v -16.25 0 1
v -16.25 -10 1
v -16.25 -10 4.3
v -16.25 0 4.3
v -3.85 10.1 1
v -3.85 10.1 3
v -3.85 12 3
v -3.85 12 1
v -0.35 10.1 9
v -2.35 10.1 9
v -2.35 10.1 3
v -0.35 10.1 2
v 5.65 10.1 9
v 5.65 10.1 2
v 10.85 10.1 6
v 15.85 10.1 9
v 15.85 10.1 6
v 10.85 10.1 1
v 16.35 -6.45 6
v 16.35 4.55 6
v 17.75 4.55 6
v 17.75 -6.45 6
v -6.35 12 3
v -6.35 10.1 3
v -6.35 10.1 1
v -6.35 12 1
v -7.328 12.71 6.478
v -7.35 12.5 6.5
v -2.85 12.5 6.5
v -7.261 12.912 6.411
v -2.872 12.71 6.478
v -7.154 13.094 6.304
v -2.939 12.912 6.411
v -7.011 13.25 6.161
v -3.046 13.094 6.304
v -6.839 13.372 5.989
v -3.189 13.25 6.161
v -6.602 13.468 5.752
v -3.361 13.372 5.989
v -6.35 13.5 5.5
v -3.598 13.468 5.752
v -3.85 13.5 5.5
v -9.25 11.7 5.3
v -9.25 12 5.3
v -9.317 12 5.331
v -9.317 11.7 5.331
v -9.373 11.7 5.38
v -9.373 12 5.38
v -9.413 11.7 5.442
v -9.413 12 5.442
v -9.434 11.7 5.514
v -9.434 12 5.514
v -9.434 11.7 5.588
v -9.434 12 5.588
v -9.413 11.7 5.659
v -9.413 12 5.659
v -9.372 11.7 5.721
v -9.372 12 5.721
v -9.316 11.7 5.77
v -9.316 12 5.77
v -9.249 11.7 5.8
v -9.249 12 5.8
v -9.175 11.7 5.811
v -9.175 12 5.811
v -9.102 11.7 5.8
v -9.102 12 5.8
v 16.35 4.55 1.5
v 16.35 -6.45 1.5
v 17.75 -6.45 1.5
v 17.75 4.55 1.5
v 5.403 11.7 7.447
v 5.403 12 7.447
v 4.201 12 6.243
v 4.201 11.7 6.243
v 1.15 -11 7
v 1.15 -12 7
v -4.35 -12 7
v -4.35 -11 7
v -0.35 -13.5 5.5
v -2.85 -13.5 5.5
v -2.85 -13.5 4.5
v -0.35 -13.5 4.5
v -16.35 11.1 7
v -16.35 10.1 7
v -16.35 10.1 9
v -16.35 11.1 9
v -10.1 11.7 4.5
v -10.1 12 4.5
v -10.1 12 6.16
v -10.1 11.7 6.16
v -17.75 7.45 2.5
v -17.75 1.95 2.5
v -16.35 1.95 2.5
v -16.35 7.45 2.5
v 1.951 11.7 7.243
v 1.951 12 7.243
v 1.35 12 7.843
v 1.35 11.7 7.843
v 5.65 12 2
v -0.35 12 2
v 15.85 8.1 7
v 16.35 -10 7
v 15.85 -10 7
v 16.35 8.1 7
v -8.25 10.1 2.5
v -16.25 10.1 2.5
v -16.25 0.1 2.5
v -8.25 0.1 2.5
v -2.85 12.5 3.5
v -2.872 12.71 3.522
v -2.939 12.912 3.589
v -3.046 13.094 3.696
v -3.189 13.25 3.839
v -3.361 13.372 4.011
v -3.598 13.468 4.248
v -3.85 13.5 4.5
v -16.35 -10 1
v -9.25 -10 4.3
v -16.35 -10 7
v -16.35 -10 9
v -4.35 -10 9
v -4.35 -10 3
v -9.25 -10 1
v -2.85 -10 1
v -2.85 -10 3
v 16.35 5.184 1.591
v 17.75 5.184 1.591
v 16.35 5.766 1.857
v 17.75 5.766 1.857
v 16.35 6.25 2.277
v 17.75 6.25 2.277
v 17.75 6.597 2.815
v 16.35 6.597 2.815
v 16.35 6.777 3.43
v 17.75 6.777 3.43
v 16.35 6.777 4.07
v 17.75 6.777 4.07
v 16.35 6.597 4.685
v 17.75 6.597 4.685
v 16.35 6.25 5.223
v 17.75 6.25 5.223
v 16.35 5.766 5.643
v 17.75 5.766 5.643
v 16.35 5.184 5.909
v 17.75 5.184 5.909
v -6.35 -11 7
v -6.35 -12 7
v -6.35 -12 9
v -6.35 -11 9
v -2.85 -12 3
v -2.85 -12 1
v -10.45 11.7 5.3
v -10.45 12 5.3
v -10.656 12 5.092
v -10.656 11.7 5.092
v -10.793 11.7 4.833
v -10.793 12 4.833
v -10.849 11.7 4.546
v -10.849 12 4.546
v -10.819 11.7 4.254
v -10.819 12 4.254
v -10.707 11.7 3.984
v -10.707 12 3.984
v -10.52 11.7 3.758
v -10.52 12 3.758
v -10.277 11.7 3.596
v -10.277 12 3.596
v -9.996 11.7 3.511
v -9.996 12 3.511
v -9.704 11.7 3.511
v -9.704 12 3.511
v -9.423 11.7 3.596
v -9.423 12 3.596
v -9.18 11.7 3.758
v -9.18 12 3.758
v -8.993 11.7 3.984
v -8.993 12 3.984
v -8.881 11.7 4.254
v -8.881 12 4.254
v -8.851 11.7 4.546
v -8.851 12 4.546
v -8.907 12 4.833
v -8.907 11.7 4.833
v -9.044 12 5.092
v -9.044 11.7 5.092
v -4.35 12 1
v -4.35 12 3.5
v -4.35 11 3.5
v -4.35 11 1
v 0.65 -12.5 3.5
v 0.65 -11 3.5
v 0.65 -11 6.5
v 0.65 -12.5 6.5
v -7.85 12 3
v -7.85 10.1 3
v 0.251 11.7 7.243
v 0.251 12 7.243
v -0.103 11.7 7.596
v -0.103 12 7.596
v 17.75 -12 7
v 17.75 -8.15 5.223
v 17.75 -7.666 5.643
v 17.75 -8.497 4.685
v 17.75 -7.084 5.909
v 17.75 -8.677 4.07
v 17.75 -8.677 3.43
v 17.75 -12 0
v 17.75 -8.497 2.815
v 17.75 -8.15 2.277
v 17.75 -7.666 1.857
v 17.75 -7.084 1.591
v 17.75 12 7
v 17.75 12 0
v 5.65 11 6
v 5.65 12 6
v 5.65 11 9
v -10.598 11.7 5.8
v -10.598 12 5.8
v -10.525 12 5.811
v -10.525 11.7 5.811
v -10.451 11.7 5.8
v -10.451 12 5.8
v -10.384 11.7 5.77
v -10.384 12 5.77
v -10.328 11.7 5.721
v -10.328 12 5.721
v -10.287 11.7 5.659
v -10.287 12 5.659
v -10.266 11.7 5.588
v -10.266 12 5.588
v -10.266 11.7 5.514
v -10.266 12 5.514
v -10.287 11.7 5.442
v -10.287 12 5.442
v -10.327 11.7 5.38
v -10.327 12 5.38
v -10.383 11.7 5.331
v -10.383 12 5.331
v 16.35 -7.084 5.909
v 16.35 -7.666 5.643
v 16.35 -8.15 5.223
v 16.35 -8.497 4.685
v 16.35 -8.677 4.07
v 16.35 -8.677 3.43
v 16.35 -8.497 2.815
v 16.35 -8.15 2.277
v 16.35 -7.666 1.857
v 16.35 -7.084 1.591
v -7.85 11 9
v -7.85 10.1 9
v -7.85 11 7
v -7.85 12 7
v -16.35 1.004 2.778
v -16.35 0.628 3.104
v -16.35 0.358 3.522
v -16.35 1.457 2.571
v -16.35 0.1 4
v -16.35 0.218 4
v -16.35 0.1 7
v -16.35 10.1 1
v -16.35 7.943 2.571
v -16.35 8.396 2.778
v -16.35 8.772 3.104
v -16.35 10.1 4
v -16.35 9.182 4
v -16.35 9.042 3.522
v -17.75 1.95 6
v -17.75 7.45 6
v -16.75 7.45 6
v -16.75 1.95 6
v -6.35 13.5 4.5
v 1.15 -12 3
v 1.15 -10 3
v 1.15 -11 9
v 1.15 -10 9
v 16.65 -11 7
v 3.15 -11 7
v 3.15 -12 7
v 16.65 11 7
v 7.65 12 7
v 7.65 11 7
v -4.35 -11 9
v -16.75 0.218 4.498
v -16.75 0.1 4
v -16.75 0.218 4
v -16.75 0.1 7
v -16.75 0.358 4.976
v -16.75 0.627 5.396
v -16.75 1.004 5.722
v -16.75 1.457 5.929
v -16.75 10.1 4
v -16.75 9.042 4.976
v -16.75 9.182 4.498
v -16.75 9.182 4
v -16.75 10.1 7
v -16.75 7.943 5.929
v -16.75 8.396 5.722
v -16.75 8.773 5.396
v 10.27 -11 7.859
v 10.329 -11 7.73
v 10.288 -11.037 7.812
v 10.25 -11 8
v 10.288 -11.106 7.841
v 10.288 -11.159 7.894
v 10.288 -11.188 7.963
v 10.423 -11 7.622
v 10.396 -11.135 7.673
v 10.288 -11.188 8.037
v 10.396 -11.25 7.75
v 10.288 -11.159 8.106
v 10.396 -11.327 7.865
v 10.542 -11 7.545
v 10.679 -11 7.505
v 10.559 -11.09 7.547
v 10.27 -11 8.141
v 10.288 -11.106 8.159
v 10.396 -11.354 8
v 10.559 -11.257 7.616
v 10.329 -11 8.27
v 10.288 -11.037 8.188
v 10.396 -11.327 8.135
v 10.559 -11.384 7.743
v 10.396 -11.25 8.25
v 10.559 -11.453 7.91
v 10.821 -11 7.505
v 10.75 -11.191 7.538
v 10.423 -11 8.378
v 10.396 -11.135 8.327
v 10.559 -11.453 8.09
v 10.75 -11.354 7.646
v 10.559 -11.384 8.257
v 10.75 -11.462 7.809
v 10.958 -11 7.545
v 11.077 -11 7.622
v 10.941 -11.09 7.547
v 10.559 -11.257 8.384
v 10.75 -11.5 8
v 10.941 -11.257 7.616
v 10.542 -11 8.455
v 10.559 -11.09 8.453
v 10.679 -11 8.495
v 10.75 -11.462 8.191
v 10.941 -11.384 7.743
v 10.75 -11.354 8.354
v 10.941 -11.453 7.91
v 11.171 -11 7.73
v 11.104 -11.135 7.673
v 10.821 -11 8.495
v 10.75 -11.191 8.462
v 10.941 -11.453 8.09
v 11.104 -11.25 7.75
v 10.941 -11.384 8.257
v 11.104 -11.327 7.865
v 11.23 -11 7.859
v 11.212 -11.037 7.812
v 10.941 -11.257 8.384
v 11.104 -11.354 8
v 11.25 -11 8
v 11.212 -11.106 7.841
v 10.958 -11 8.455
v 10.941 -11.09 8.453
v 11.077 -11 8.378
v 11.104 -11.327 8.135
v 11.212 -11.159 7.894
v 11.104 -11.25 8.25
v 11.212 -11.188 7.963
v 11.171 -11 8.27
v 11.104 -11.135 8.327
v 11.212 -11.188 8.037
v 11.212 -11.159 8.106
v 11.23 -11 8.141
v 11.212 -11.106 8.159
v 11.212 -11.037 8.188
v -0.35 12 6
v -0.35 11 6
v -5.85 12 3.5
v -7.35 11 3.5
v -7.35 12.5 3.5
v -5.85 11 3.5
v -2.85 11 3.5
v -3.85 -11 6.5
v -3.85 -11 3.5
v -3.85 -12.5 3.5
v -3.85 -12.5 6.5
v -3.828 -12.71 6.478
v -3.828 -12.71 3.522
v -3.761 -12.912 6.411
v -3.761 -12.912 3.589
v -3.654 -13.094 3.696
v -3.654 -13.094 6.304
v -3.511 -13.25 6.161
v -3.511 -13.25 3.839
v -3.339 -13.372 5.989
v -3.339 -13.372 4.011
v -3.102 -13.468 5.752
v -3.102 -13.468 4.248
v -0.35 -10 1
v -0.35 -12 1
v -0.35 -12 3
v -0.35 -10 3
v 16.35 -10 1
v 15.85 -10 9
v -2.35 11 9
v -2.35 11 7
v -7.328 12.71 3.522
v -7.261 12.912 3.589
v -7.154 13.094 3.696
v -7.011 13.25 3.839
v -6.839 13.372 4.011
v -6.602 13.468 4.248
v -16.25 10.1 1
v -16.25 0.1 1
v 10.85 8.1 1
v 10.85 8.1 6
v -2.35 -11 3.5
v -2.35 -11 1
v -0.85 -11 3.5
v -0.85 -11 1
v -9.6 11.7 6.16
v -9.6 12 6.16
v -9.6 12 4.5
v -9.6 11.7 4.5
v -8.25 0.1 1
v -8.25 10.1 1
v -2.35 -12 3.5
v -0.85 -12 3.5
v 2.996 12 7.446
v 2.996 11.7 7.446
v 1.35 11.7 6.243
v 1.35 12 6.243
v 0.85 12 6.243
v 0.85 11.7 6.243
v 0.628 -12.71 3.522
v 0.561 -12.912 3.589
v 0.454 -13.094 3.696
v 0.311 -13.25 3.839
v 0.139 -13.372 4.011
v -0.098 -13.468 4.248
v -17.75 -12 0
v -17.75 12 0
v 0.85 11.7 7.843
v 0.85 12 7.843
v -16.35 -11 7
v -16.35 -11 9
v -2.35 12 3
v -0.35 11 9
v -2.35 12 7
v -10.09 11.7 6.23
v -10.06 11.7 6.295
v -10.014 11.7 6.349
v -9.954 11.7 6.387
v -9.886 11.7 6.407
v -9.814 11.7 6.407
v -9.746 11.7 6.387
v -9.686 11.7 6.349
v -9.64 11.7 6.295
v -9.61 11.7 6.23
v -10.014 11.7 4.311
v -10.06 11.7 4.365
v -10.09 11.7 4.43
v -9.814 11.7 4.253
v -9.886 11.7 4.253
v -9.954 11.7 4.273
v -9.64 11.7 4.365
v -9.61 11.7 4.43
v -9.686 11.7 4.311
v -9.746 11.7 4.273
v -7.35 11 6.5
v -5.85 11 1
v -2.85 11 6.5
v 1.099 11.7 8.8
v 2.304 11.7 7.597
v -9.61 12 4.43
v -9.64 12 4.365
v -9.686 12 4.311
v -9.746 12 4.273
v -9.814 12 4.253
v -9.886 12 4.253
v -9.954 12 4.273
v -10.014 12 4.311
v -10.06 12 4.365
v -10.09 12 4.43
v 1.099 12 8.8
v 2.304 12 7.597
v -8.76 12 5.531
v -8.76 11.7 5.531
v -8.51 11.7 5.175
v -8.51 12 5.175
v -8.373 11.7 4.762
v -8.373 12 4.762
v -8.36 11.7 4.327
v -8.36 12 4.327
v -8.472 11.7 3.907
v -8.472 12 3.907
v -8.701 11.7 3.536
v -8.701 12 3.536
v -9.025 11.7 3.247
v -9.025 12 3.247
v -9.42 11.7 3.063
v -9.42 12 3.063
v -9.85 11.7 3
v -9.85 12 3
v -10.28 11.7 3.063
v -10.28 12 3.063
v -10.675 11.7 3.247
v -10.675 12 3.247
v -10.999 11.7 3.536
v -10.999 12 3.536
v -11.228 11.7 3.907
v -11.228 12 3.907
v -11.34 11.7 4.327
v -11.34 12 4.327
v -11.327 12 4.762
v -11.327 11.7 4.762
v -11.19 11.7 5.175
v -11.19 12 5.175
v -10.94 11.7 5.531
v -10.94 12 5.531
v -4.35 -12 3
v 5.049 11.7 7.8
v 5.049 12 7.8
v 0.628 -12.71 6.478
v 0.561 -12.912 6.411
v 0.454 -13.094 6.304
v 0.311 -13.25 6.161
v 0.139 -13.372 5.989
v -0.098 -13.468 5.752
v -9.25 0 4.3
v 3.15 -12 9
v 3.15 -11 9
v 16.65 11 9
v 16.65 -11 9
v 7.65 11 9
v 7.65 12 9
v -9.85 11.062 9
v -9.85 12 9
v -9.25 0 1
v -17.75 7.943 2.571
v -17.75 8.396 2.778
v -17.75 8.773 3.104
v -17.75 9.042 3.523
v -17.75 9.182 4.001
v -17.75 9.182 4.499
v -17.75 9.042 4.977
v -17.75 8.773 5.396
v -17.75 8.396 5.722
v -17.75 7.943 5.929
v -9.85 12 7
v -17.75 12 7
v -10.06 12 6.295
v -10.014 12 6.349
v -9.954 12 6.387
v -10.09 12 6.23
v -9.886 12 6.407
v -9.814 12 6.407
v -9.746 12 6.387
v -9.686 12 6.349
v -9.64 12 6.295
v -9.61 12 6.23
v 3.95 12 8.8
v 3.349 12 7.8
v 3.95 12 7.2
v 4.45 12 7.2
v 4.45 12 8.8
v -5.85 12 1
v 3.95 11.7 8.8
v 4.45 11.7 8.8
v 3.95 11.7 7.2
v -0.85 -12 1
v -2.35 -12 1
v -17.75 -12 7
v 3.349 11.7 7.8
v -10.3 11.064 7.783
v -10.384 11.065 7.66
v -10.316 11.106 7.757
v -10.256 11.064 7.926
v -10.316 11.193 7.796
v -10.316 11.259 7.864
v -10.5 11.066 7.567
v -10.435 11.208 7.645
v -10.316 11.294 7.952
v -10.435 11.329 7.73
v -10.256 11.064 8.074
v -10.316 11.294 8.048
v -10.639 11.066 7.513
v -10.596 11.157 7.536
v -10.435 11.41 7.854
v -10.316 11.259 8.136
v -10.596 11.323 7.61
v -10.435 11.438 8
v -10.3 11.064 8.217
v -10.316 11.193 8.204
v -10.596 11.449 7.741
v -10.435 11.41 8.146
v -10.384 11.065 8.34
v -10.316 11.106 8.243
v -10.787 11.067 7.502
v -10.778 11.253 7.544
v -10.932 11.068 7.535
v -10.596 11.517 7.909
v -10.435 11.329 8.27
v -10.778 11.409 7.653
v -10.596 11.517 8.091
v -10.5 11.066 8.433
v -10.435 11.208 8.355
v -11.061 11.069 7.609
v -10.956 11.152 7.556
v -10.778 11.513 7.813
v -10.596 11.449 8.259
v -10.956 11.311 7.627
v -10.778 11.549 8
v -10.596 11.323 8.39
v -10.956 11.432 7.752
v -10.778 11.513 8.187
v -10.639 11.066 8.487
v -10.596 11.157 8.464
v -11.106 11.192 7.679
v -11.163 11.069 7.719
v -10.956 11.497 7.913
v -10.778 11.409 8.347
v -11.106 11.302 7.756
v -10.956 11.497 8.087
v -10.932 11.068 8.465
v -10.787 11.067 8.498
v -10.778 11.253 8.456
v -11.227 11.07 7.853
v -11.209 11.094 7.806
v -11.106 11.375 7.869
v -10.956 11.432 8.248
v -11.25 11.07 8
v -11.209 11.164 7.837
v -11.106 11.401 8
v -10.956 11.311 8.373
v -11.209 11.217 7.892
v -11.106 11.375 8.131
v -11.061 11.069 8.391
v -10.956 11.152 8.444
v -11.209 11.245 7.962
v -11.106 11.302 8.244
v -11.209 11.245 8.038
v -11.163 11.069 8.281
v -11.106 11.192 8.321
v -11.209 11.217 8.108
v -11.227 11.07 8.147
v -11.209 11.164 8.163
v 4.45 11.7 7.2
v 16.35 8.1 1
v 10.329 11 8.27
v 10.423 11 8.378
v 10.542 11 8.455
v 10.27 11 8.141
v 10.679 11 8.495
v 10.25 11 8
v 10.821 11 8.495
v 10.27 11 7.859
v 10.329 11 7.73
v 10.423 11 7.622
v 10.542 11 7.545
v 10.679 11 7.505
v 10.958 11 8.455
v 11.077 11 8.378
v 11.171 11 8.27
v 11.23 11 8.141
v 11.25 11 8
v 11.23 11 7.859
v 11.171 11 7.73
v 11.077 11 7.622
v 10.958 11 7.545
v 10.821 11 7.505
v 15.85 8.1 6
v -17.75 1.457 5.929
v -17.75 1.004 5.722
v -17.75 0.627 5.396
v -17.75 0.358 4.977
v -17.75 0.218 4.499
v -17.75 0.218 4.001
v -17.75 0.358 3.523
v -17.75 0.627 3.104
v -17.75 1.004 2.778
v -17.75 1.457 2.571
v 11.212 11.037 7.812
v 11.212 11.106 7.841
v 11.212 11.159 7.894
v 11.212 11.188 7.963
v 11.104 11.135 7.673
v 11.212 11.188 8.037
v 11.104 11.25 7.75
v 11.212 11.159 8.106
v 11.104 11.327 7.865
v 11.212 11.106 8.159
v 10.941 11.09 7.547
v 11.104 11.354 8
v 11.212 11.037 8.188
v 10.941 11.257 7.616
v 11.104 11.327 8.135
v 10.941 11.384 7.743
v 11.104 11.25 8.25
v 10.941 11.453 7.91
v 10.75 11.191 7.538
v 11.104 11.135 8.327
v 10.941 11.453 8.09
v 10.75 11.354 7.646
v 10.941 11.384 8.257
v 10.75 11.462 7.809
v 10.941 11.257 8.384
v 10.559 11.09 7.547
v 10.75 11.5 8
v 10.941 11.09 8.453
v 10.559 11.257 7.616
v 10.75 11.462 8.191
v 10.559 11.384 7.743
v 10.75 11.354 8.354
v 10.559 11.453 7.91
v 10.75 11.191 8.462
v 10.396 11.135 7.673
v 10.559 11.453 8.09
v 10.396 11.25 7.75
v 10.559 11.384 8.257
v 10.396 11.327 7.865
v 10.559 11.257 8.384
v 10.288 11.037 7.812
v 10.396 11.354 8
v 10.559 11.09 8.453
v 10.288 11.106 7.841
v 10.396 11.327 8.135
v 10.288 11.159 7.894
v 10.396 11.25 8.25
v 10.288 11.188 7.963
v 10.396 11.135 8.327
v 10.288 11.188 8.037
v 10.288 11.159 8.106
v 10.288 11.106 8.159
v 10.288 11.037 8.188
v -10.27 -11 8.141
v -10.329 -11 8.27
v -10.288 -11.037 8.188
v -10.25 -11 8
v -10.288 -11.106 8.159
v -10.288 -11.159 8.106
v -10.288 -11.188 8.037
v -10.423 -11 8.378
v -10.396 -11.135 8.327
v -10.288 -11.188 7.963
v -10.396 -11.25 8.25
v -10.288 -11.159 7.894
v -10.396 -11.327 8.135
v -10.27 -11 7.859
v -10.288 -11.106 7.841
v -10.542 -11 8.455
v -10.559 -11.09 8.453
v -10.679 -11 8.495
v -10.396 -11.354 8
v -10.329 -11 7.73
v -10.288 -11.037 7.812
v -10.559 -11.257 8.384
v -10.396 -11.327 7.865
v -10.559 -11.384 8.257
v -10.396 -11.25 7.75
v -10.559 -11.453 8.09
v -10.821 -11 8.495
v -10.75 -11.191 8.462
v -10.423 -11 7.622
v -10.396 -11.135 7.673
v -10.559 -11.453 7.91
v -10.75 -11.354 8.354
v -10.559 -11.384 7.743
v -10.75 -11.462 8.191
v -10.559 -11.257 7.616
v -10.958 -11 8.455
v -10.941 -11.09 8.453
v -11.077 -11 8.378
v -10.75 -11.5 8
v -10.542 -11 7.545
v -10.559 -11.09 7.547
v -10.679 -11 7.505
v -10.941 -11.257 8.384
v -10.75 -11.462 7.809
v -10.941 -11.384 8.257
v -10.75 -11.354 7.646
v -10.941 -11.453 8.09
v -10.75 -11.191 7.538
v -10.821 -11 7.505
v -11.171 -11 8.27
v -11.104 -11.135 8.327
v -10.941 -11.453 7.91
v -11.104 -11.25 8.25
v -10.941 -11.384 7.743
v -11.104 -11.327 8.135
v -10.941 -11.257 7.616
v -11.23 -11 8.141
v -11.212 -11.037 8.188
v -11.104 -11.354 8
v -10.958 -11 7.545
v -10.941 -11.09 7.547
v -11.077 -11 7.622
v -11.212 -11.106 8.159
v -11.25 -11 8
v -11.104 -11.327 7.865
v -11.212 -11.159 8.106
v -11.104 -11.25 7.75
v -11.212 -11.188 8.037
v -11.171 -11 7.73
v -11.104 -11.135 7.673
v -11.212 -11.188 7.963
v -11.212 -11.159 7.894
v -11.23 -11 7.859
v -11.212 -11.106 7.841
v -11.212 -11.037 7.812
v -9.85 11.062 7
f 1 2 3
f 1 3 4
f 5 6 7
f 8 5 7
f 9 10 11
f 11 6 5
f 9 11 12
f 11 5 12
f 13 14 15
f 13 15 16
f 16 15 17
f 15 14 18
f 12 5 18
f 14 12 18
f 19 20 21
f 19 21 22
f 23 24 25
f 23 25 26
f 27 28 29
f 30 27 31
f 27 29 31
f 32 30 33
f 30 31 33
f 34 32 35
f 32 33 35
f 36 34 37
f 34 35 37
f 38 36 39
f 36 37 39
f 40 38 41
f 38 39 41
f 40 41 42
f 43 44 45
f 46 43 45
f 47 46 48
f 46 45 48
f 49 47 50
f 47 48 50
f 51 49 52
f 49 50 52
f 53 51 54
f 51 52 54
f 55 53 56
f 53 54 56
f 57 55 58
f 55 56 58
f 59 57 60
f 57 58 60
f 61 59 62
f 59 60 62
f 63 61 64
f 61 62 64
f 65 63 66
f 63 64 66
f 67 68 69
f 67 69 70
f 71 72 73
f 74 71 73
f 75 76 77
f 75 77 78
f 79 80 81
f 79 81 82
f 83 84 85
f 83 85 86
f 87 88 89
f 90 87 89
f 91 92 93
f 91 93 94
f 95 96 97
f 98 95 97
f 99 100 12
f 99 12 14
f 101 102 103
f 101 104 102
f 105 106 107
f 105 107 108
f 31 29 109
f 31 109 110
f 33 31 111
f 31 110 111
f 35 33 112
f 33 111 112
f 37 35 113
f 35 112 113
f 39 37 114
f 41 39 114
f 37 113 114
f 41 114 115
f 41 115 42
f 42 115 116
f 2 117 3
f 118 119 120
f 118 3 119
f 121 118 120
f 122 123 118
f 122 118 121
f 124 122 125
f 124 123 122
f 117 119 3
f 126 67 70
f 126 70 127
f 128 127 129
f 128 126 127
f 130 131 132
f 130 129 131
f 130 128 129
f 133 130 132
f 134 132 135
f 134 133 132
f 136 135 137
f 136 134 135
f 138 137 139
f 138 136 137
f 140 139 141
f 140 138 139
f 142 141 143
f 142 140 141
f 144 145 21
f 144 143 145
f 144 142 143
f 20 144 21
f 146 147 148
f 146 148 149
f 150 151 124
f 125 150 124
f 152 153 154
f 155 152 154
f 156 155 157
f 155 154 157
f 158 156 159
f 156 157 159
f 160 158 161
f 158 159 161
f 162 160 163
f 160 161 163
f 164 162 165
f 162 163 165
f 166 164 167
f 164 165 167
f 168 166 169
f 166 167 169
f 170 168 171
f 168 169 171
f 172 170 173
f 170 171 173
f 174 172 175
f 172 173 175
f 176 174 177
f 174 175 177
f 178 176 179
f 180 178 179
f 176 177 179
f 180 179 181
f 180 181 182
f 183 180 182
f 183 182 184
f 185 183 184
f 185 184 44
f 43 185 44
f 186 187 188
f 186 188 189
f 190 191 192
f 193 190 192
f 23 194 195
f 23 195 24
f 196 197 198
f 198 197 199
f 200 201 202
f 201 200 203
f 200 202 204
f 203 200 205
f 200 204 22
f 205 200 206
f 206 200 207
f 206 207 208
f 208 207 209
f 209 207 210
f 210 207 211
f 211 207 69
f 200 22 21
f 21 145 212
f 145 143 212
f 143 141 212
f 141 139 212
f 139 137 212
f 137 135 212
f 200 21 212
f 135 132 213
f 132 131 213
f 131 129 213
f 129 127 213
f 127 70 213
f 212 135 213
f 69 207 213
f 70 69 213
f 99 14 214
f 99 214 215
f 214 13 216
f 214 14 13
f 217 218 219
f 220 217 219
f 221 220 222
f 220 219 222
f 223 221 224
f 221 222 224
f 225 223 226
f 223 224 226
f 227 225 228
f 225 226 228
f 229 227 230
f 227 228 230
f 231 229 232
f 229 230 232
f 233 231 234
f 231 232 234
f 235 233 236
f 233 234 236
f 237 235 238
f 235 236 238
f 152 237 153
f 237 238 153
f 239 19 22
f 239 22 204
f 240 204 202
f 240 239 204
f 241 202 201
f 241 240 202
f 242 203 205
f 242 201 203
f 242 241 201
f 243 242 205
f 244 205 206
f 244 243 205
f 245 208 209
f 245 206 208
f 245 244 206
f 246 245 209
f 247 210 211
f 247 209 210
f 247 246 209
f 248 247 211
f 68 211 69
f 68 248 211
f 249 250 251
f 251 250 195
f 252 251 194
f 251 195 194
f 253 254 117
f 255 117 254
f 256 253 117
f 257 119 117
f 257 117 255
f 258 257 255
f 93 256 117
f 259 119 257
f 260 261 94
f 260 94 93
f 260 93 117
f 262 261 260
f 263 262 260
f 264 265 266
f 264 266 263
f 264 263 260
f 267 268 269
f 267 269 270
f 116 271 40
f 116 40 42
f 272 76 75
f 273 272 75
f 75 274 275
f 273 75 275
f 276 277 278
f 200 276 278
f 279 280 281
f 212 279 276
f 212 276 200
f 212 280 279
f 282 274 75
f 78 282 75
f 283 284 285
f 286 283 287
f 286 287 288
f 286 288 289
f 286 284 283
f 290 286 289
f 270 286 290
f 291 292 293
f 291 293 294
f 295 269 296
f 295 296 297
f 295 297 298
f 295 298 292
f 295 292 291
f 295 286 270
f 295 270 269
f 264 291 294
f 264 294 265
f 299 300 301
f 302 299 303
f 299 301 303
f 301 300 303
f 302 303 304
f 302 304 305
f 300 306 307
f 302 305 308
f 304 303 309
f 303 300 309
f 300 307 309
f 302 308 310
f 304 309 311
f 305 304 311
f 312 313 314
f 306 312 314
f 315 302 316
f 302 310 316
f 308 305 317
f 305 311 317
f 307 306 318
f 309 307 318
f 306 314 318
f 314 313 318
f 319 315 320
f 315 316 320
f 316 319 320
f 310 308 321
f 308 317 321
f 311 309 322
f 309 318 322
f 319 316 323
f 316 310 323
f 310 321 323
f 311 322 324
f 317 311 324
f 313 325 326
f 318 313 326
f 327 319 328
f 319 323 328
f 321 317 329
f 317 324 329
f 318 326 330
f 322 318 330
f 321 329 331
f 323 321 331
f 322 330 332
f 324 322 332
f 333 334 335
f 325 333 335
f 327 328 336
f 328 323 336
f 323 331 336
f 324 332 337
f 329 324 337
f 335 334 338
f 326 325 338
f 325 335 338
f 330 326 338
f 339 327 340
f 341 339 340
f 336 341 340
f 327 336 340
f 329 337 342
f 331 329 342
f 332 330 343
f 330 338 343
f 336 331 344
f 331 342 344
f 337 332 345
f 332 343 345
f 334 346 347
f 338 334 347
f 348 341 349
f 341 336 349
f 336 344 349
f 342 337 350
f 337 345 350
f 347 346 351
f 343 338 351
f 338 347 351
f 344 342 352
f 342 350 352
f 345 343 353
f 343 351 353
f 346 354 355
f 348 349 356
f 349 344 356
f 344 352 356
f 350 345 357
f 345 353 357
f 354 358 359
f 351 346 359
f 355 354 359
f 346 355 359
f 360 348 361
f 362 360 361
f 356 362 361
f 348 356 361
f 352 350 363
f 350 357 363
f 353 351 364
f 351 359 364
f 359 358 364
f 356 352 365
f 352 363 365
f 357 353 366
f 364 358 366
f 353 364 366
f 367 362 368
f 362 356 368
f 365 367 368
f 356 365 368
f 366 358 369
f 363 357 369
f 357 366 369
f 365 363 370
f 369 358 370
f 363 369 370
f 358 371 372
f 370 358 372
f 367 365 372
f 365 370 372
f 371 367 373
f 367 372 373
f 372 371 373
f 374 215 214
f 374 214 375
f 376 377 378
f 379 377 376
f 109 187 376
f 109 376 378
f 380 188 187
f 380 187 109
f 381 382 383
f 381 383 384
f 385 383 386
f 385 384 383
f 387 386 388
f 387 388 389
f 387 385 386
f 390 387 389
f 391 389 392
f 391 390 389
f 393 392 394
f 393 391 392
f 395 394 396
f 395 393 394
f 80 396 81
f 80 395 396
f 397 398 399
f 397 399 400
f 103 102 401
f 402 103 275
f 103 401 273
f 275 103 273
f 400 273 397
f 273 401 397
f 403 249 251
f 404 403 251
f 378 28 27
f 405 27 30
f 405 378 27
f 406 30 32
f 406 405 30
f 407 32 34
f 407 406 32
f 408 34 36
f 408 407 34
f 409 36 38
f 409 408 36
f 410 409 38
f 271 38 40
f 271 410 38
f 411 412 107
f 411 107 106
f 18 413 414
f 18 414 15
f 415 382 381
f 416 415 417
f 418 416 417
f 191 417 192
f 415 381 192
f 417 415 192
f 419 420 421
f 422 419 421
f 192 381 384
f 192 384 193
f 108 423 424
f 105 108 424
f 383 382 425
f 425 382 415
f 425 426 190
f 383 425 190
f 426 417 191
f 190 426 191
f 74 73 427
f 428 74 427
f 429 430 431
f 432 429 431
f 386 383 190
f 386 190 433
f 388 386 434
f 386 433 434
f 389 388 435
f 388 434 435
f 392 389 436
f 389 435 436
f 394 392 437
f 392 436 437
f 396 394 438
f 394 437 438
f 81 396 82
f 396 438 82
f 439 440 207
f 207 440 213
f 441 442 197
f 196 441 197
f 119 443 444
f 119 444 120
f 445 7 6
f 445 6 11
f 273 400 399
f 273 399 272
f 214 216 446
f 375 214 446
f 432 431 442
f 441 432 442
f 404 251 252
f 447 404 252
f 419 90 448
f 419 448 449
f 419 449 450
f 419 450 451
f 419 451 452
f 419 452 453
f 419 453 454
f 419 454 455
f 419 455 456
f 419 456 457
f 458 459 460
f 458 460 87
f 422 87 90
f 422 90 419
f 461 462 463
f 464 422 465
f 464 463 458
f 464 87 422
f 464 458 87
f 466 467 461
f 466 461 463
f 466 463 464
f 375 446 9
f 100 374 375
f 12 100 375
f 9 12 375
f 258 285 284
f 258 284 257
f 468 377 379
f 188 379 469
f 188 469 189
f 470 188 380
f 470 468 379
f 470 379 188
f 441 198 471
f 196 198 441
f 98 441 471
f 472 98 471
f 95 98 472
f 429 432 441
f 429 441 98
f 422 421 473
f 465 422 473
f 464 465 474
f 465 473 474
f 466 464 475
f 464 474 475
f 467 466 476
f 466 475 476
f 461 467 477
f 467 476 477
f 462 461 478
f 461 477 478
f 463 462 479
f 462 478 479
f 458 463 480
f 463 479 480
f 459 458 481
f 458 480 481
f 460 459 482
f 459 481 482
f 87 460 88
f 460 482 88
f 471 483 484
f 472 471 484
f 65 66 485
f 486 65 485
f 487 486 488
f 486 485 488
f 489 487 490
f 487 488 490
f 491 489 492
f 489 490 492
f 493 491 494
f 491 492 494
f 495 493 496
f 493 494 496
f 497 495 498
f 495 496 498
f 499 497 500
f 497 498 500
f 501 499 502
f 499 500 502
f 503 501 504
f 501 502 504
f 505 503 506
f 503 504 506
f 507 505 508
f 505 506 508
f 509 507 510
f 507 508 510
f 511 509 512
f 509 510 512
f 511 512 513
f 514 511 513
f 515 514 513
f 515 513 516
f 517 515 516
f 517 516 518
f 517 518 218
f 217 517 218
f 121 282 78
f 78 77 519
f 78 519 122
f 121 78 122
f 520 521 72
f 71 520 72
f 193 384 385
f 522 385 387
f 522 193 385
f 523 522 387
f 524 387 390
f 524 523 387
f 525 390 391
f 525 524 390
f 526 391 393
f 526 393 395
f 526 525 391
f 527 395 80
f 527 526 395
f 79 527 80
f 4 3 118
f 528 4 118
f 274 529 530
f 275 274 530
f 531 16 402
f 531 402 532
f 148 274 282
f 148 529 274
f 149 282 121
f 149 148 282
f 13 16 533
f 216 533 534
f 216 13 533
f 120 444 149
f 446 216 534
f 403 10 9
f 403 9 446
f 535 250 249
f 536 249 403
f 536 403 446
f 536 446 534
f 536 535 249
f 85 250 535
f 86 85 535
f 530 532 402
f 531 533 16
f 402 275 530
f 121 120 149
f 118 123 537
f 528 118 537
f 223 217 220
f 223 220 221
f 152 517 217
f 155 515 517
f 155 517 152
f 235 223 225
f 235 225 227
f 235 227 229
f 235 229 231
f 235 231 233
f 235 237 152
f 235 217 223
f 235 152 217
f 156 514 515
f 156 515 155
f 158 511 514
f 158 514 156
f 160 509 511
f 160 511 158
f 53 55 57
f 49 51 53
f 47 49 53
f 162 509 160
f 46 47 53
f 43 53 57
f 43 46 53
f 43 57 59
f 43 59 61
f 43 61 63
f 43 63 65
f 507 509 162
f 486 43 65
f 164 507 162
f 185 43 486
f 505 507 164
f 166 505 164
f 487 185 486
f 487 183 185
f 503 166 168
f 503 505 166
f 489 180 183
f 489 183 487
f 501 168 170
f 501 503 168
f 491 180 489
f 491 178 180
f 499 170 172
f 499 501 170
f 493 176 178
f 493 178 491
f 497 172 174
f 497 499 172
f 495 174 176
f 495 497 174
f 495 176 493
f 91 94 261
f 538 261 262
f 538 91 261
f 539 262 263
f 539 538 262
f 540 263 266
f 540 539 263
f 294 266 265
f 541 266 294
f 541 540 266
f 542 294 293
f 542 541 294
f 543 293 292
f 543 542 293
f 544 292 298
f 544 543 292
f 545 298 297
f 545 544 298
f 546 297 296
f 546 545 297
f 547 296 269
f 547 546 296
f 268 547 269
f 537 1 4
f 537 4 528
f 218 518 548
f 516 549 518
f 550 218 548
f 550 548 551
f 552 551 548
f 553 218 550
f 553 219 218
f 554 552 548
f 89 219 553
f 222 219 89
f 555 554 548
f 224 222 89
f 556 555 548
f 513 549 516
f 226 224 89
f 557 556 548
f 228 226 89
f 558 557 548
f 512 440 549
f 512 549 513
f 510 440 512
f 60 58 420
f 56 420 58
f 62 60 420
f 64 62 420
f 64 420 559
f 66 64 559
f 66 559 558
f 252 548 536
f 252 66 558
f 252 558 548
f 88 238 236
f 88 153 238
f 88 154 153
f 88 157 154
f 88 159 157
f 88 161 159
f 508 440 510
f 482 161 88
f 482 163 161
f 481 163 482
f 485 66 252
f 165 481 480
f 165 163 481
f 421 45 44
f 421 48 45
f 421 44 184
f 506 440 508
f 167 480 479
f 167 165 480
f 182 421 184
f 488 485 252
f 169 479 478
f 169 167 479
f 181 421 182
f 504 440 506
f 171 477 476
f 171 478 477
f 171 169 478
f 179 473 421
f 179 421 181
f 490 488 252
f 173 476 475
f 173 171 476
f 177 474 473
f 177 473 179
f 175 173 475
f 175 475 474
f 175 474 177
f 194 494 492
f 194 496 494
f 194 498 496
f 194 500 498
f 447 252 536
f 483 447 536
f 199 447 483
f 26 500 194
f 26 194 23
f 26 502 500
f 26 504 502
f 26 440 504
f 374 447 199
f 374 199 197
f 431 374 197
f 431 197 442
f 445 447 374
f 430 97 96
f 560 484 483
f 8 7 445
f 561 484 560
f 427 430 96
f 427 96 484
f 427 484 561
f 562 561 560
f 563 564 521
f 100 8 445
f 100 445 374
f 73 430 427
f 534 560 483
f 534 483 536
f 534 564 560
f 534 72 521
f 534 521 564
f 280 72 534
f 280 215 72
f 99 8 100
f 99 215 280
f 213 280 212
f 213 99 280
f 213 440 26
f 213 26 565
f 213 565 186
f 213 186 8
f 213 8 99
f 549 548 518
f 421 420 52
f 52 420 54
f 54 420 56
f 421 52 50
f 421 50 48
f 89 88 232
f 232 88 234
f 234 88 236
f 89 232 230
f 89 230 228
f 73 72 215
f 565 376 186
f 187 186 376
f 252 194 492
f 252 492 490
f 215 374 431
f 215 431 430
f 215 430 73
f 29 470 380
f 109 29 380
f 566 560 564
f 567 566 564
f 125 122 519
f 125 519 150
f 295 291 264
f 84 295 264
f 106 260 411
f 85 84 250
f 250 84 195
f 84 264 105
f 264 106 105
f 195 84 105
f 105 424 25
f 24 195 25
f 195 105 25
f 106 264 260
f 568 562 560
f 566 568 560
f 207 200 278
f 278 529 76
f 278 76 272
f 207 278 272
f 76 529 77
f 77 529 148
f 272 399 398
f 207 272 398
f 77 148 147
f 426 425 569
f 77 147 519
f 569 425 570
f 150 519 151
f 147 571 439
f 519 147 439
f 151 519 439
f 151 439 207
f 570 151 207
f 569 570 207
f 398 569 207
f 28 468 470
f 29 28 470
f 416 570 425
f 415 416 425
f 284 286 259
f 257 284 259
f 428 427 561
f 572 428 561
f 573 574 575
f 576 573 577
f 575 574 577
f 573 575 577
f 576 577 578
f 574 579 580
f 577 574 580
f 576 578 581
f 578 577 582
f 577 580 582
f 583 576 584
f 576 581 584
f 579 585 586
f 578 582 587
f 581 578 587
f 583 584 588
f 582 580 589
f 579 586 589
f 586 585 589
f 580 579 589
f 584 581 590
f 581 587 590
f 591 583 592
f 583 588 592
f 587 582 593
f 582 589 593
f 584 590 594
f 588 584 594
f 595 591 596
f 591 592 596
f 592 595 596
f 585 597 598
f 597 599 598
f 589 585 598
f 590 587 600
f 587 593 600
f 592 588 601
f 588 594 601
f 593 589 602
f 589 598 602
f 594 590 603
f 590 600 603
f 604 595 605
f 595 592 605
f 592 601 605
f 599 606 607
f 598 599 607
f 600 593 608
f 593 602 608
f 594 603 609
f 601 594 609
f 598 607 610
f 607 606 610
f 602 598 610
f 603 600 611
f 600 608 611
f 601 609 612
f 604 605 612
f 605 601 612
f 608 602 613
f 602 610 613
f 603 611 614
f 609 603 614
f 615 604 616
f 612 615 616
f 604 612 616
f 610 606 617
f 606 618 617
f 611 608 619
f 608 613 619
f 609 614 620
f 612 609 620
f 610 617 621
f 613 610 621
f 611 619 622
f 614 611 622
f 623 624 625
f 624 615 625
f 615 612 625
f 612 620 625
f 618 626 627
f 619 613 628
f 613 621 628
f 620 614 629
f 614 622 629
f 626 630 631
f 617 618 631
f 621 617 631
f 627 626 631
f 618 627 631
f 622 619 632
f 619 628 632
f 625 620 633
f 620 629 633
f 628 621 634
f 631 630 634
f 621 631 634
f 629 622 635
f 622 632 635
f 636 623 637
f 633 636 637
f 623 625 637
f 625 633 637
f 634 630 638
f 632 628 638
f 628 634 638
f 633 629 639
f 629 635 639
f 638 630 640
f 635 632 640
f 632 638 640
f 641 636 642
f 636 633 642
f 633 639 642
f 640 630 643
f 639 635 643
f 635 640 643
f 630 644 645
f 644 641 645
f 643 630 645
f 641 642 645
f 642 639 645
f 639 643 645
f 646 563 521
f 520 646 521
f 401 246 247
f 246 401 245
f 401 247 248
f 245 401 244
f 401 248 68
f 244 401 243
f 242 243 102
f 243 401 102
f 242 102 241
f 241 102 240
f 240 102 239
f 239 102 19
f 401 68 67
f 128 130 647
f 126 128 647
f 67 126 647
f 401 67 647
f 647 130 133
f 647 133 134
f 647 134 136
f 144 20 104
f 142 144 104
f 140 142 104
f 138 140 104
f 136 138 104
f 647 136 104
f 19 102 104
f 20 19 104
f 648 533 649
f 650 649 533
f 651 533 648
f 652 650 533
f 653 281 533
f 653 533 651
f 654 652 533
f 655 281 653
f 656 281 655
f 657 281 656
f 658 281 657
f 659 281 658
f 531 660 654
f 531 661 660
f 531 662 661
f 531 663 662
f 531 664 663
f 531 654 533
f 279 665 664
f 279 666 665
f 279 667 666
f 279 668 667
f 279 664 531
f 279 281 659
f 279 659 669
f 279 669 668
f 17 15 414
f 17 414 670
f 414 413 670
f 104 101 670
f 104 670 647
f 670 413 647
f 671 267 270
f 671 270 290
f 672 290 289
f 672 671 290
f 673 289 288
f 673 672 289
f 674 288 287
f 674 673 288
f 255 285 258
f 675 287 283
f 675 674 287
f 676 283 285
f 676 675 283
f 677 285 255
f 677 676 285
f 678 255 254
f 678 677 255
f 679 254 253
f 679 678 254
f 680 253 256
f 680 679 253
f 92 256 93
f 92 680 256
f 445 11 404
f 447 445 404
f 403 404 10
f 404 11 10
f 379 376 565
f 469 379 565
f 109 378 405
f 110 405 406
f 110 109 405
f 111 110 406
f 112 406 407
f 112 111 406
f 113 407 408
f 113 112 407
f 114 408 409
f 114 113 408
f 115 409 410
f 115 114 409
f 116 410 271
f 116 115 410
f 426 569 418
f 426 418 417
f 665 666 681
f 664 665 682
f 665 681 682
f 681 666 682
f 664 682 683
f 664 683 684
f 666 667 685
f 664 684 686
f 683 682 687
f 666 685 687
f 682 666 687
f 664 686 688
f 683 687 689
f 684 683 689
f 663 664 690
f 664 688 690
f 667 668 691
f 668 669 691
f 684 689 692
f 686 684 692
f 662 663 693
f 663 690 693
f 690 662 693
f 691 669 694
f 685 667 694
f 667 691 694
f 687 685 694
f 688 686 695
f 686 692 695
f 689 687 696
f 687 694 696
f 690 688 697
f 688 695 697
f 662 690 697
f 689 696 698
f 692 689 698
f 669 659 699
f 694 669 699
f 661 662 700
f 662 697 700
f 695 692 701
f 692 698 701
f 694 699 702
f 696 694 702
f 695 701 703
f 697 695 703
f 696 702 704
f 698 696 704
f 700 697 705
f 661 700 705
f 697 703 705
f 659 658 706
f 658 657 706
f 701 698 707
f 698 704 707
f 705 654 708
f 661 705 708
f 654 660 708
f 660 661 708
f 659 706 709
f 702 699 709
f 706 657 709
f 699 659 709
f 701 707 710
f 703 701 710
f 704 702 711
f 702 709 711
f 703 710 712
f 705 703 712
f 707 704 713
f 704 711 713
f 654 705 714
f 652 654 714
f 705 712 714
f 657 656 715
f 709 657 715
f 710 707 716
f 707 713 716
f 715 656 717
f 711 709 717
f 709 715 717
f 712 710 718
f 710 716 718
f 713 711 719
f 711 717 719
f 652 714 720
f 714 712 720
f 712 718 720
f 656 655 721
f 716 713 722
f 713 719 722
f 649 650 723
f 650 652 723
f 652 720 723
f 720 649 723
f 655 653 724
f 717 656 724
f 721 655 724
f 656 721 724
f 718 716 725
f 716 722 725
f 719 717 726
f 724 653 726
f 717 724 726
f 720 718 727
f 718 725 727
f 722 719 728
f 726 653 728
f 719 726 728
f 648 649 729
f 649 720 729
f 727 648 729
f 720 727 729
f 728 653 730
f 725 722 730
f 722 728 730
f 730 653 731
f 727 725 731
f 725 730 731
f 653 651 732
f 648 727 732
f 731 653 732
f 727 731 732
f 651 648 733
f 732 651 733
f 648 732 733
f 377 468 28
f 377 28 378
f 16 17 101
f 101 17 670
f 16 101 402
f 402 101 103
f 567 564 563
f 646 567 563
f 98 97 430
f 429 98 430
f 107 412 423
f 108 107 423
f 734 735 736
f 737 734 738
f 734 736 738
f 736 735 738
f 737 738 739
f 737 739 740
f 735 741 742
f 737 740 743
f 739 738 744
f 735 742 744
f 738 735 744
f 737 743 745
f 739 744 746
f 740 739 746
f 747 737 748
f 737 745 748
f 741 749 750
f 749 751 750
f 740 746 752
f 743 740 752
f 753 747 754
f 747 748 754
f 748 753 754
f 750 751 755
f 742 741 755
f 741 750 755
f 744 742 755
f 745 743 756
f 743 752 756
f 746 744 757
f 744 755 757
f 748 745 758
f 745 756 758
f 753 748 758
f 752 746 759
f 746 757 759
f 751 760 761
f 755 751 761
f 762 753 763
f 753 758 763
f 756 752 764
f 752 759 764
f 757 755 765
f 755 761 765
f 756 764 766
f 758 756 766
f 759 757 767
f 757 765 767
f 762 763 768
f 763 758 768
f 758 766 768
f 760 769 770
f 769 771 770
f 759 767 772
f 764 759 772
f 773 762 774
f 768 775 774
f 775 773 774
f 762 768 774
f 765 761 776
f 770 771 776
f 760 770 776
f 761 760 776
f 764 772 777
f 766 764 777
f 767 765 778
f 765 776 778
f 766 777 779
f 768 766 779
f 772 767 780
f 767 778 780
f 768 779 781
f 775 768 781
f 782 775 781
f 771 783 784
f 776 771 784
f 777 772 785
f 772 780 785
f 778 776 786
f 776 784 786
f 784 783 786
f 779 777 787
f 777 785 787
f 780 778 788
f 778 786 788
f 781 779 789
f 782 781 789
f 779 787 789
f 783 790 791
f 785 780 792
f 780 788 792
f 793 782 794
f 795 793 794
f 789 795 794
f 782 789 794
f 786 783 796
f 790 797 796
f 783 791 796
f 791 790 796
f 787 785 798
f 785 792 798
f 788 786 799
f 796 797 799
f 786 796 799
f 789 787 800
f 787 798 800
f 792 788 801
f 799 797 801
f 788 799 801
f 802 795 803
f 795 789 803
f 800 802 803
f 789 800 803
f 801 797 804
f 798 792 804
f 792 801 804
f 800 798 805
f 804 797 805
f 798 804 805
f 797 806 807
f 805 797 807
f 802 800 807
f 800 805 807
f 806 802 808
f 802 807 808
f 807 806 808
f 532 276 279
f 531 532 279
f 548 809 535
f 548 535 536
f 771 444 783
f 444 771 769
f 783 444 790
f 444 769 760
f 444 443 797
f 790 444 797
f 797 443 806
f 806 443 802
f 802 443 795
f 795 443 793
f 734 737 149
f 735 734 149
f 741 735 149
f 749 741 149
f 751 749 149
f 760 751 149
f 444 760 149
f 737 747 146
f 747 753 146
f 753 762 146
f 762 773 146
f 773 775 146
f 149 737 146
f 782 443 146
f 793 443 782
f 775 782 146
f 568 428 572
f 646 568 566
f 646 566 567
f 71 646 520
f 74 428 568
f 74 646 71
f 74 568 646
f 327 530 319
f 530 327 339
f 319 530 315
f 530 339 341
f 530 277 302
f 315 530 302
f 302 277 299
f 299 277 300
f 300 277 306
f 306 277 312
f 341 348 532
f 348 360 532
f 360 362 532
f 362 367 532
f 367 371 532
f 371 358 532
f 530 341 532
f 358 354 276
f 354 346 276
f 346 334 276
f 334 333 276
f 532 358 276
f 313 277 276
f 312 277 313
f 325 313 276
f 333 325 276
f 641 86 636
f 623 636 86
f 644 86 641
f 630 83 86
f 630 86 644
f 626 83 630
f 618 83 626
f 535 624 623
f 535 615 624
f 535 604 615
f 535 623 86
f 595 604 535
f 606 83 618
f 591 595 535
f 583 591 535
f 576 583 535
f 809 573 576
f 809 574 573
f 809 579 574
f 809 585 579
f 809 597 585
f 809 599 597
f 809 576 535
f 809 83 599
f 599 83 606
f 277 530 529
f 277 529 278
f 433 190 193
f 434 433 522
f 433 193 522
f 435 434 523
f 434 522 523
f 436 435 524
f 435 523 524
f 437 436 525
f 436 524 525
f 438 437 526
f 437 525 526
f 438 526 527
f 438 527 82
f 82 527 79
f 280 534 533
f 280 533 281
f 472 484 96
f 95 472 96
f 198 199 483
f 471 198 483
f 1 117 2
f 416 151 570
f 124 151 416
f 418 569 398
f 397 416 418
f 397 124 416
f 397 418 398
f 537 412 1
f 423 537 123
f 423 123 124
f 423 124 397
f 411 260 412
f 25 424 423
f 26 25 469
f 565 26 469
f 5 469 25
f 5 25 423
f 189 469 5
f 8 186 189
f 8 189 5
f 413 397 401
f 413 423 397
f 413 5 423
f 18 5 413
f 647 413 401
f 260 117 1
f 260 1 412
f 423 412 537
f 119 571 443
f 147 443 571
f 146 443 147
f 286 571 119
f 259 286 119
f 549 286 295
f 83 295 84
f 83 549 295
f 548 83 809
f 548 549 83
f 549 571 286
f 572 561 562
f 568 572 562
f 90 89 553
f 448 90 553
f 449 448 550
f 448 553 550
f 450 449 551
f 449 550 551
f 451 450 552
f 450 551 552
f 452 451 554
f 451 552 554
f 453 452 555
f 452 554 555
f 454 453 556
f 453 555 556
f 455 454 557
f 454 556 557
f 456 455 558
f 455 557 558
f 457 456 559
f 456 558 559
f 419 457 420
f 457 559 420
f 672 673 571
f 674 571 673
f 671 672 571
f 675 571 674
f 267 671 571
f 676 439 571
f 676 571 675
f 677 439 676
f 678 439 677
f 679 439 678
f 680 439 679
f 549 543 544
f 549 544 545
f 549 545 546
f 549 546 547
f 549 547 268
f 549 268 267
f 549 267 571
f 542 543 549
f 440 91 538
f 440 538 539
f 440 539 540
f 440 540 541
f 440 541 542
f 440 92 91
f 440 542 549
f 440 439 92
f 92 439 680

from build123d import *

# Parameters (mm, degrees)
SKETCH_1_W           = 35.5
SKETCH_1_H           = 24
EXTRUDE_1_DEPTH      = 7
SKETCH_2_W           = 33.2
SKETCH_2_H           = 22.1
CUT_EXTRUDE_1_DEPTH  = 6
CUT_EXTRUDE_2_DEPTH  = 2
EXTRUDE_2_DEPTH      = 6
SKETCH_7_W           = 5
SKETCH_7_H           = 2
EXTRUDE_3_DEPTH      = 5
CUT_EXTRUDE_4_DEPTH  = 2
SKETCH_12_W          = 5.5
SKETCH_12_H          = 2
CUT_EXTRUDE_6_DEPTH  = 6
SKETCH_19_W          = 8
SKETCH_19_H          = 10
USB_DEPTH            = 1.5
SKETCH_25_W          = 0.5
SKETCH_25_H          = 18.1
CUT_EXTRUDE_12_DEPTH = 6
SKETCH_28_W          = 5.5
SKETCH_28_H          = 1.9
CUT_EXTRUDE_13_DEPTH = 6
SKETCH_29_W          = 6
SKETCH_29_H          = 2
CUT_EXTRUDE_14_DEPTH = 5
SKETCH_34_W          = 7
SKETCH_34_H          = 10
EXTRUDE_10_DEPTH     = 3.3
SKETCH_35_W          = 0.5
SKETCH_35_H          = 10
CUT_EXTRUDE_15_DEPTH = 3
SKETCH_37_W          = 4.5
SKETCH_37_H          = 2
EXTRUDE_12_DEPTH     = 5.5
SKETCH_38_W          = 1.5
SKETCH_38_H          = 2.5
CUT_EXTRUDE_16_DEPTH = 2
SKETCH_39_W          = 4.5
SKETCH_39_H          = 1
CUT_EXTRUDE_17_DEPTH = 5.5
SKETCH_40_W          = 4.5
SKETCH_40_H          = 3
EXTRUDE_13_DEPTH     = 1.5
FILLET_2_R           = 1
SKETCH_41_W          = 4.5
SKETCH_41_H          = 2
EXTRUDE_14_DEPTH     = 5.5
SKETCH_42_W          = 1.5
SKETCH_42_H          = 2.5
CUT_EXTRUDE_18_DEPTH = 2
SKETCH_43_W          = 4.5
SKETCH_43_H          = 1
CUT_EXTRUDE_19_DEPTH = 5.5
SKETCH_44_W          = 4.5
SKETCH_44_H          = 3
EXTRUDE_15_DEPTH     = 1.5
FILLET_3_R           = 1
EXTRUDE_16_DEPTH     = 2
SKETCH_50_W          = 5.5
SKETCH_50_H          = 2
CUT_EXTRUDE_20_DEPTH = 2
SKETCH_51_W          = 5.5
SKETCH_51_H          = 2
CUT_EXTRUDE_21_DEPTH = 2
SKETCH_54_W          = 2
SKETCH_54_H          = 0.95
EXTRUDE_19_DEPTH     = 2
SKETCH_55_W          = 2
SKETCH_55_H          = 1
EXTRUDE_20_DEPTH     = 15.5
SKETCH_56_W          = 2
SKETCH_56_H          = 1
EXTRUDE_21_DEPTH     = 2
SKETCH_57_W          = 2
SKETCH_57_H          = 1
EXTRUDE_22_DEPTH     = 7.5
SKETCH_58_W          = 1.5
SKETCH_58_H          = 1.9
SKETCH_58_H_2        = 2
EXTRUDE_24_DEPTH     = 2
SKETCH_59_W          = 6
SKETCH_59_H          = 1
EXTRUDE_25_DEPTH     = 1
CUT_EXTRUDE_22_DEPTH = 0.3
CUT_EXTRUDE_23_DEPTH = 0.3


with BuildPart() as part:
    # Sketch 1 → Extrude 1 (new body)
    with BuildSketch(Plane.XY):
        Rectangle(SKETCH_1_W, SKETCH_1_H)
    extrude(amount=EXTRUDE_1_DEPTH)

    # Sketch 2 → Cut-Extrude 1 (cut)
    with BuildSketch(Plane.XY.offset(7)):
        with Locations((0.25, 0.05)):
            Rectangle(SKETCH_2_W, SKETCH_2_H)
    extrude(amount=-CUT_EXTRUDE_1_DEPTH, mode=Mode.SUBTRACT)

    # Sketch 3 → Cut-Extrude 2 (cut)
    with BuildSketch(Plane.ZY.offset(17.75)):
        with BuildLine():
            Line((6, 7.45), (6, 1.95))
            ThreePointArc((6, 1.95), (4.25, 0.2), (2.5, 1.95))
            Line((2.5, 1.95), (2.5, 7.45))
            ThreePointArc((2.5, 7.45), (4.25, 9.2), (6, 7.45))
        make_face()
    extrude(amount=-CUT_EXTRUDE_2_DEPTH, mode=Mode.SUBTRACT)

    # Sketch 6 → Extrude 2 (add)
    with BuildSketch(Plane.XY.offset(1)):
        Polygon((-16.35, 10.1), (15.85, 10.1), (15.85, -10), (-16.35, -10), (-16.35, -11), (16.85, -11), (16.85, 11.1), (-16.35, 11.1), align=None)
    extrude(amount=EXTRUDE_2_DEPTH)

    # Sketch 7 → Extrude 3 (add)
    with BuildSketch(Plane.XY.offset(1)):
        with Locations((13.35, 9.1)):
            Rectangle(SKETCH_7_W, SKETCH_7_H)
    extrude(amount=EXTRUDE_3_DEPTH)

    # Sketch 10 → Cut-Extrude 4 (cut)
    with BuildSketch(Plane.ZY.offset(-15.85)):
        with BuildLine():
            Line((1.5, -6.45), (1.5, 4.55))
            ThreePointArc((1.5, 4.55), (3.75, 6.8), (6, 4.55))
            Line((6, 4.55), (6, -6.45))
            ThreePointArc((6, -6.45), (3.75, -8.7), (1.5, -6.45))
        make_face()
    extrude(amount=-CUT_EXTRUDE_4_DEPTH, mode=Mode.SUBTRACT)

    # Sketch 12 → Cut-Extrude 6 (cut)
    with BuildSketch(Plane.XY.offset(7)):
        with Locations((-1.6, -11)):
            Rectangle(SKETCH_12_W, SKETCH_12_H)
    extrude(amount=-CUT_EXTRUDE_6_DEPTH, mode=Mode.SUBTRACT)

    # Sketch 19 → USB (add)
    with BuildSketch(Plane.XY.offset(1)):
        with Locations((-12.25, 5.1)):
            Rectangle(SKETCH_19_W, SKETCH_19_H)
    extrude(amount=USB_DEPTH)

    # Sketch 25 → Cut-Extrude 12 (cut)
    with BuildSketch(Plane.XY.offset(7)):
        with Locations((16.1, -0.95)):
            Rectangle(SKETCH_25_W, SKETCH_25_H)
    extrude(amount=-CUT_EXTRUDE_12_DEPTH, mode=Mode.SUBTRACT)

    # Sketch 28 → Cut-Extrude 13 (cut)
    with BuildSketch(Plane.XY.offset(7)):
        with Locations((-5.1, 11.05)):
            Rectangle(SKETCH_28_W, SKETCH_28_H)
    extrude(amount=-CUT_EXTRUDE_13_DEPTH, mode=Mode.SUBTRACT)

    # Sketch 29 → Cut-Extrude 14 (cut)
    with BuildSketch(Plane.XY.offset(7)):
        with Locations((2.65, 11)):
            Rectangle(SKETCH_29_W, SKETCH_29_H)
    extrude(amount=-CUT_EXTRUDE_14_DEPTH, mode=Mode.SUBTRACT)

    # Sketch 34 → Extrude 10 (add)
    with BuildSketch(Plane.XY.offset(1)):
        with Locations((-12.75, -5)):
            Rectangle(SKETCH_34_W, SKETCH_34_H)
    extrude(amount=EXTRUDE_10_DEPTH)

    # Sketch 35 → Cut-Extrude 15 (cut)
    with BuildSketch(Plane.XY.offset(7)):
        with Locations((-16.5, 5.1)):
            Rectangle(SKETCH_35_W, SKETCH_35_H)
    extrude(amount=-CUT_EXTRUDE_15_DEPTH, mode=Mode.SUBTRACT)

    # Sketch 37 → Extrude 12 (add)
    with BuildSketch(Plane.XY.offset(1)):
        with Locations((-1.6, -11)):
            Rectangle(SKETCH_37_W, SKETCH_37_H)
    extrude(amount=EXTRUDE_12_DEPTH)

    # Sketch 38 → Cut-Extrude 16 (cut)
    with BuildSketch(Plane.XZ.offset(12)):
        with Locations((-3.1, 2.25)):
            Rectangle(SKETCH_38_W, SKETCH_38_H)
        with Locations((-0.1, 2.25)):
            Rectangle(SKETCH_38_W, SKETCH_38_H)
    extrude(amount=-CUT_EXTRUDE_16_DEPTH, mode=Mode.SUBTRACT)

    # Sketch 39 → Cut-Extrude 17 (cut)
    with BuildSketch(Plane.XY.offset(6.5)):
        with Locations((-1.6, -10.5)):
            Rectangle(SKETCH_39_W, SKETCH_39_H)
    extrude(amount=-CUT_EXTRUDE_17_DEPTH, mode=Mode.SUBTRACT)

    # Sketch 40 → Extrude 13 (add)
    with BuildSketch(Plane.XZ.offset(12)):
        with Locations((-1.6, 5)):
            Rectangle(SKETCH_40_W, SKETCH_40_H)
    extrude(amount=EXTRUDE_13_DEPTH)

    # Fillet 2
    fillet_2_edges = [part.edges().sort_by_distance(p)[0] for p in [
        (-3.85, -13.5, 5),
        (-1.6, -13.5, 3.5),
        (0.65, -13.5, 5),
        (-1.6, -13.5, 6.5),
    ]]
    fillet(fillet_2_edges, radius=FILLET_2_R)

    # Sketch 41 → Extrude 14 (add)
    with BuildSketch(Plane.XY.offset(1)):
        with Locations((-5.1, 11)):
            Rectangle(SKETCH_41_W, SKETCH_41_H)
    extrude(amount=EXTRUDE_14_DEPTH)

    # Sketch 42 → Cut-Extrude 18 (cut)
    with BuildSketch(Plane(origin=(0, 12, 0), x_dir=(1, 0, 0), z_dir=(0, 1, 0))):
        with Locations((-6.6, -2.25)):
            Rectangle(SKETCH_42_W, SKETCH_42_H)
        with Locations((-3.6, -2.25)):
            Rectangle(SKETCH_42_W, SKETCH_42_H)
    extrude(amount=-CUT_EXTRUDE_18_DEPTH, mode=Mode.SUBTRACT)

    # Sketch 43 → Cut-Extrude 19 (cut)
    with BuildSketch(Plane.XY.offset(6.5)):
        with Locations((-5.1, 10.5)):
            Rectangle(SKETCH_43_W, SKETCH_43_H)
    extrude(amount=-CUT_EXTRUDE_19_DEPTH, mode=Mode.SUBTRACT)

    # Sketch 44 → Extrude 15 (add)
    with BuildSketch(Plane(origin=(0, 12, 0), x_dir=(1, 0, 0), z_dir=(0, 1, 0))):
        with Locations((-5.1, -5)):
            Rectangle(SKETCH_44_W, SKETCH_44_H)
    extrude(amount=EXTRUDE_15_DEPTH)

    # Fillet 3
    fillet_3_edges = [part.edges().sort_by_distance(p)[0] for p in [
        (-7.35, 13.5, 5),
        (-5.1, 13.5, 6.5),
        (-2.85, 13.5, 5),
        (-5.1, 13.5, 3.5),
    ]]
    fillet(fillet_3_edges, radius=FILLET_3_R)

    # Sketch 45 → Extrude 16 (add)
    with BuildSketch(Plane.XY.offset(7)):
        Polygon((-7.85, 10.1), (-16.35, 10.1), (-16.35, 11.1), (-7.85, 11.05), (-2.25, 11.05), (-0.35, 11.05), (-0.35, 10.1), (-2.35, 10.1), align=None)
        Polygon((1.25, -11), (-16.35, -11), (-16.35, -10), (1.15, -10), (15.85, -10), (15.85, 10.1), (5.65, 10.1), (5.65, 11), (16.65, 11), (16.65, 10), (16.65, -11), align=None)
    extrude(amount=EXTRUDE_16_DEPTH)

    # Sketch 46 → Revolve 1 (revolve)
    with BuildSketch(Plane.XZ.offset(11)):
        with BuildLine():
            Line((-11.25, 8), (-10.25, 8))
            ThreePointArc((-10.25, 8), (-10.75, 8.5), (-11.25, 8))
        make_face()
    revolve(axis=Axis((-11.25, -11, 8), (1, 0, 0)))

    # Sketch 47 → Revolve 2 (revolve)
    with BuildSketch(Plane.XZ.offset(11)):
        with BuildLine():
            Line((11.25, 8), (10.25, 8))
            ThreePointArc((10.25, 8), (10.75, 8.5), (11.25, 8))
        make_face()
    revolve(axis=Axis((11.25, -11, 8), (-1, 0, 0)))

    # Sketch 48 → Revolve 3 (revolve)
    with BuildSketch(Plane(origin=(0, 11.05, 0), x_dir=(1, 0, 0), z_dir=(0, 1, 0))):
        with BuildLine():
            Line((-11.25, -8), (-10.25, -8))
            ThreePointArc((-10.25, -8), (-10.75, -7.5), (-11.25, -8))
        make_face()
    revolve(axis=Axis((-11.25, 11.05, 8), (1, 0, 0)))

    # Sketch 49 → Revolve 4 (revolve)
    with BuildSketch(Plane(origin=(0, 11, 0), x_dir=(1, 0, 0), z_dir=(0, 1, 0))):
        with BuildLine():
            Line((10.25, -8), (11.25, -8))
            ThreePointArc((11.25, -8), (10.75, -7.5), (10.25, -8))
        make_face()
    revolve(axis=Axis((10.25, 11, 8), (1, 0, 0)))

    # Sketch 50 → Cut-Extrude 20 (cut)
    with BuildSketch(Plane.XZ.offset(-10.1)):
        with Locations((-5.1, 8)):
            Rectangle(SKETCH_50_W, SKETCH_50_H)
    extrude(amount=-CUT_EXTRUDE_20_DEPTH, mode=Mode.SUBTRACT)

    # Sketch 51 → Cut-Extrude 21 (cut)
    with BuildSketch(Plane.XZ.offset(11)):
        with Locations((-1.6, 8)):
            Rectangle(SKETCH_51_W, SKETCH_51_H)
    extrude(amount=-CUT_EXTRUDE_21_DEPTH, mode=Mode.SUBTRACT)

    # Sketch 54 → Extrude 19 (add)
    with BuildSketch(Plane.XY.offset(7)):
        with Locations((-8.85, 11.525)):
            Rectangle(SKETCH_54_W, SKETCH_54_H)
    extrude(amount=EXTRUDE_19_DEPTH)

    # Sketch 55 → Extrude 20 (add)
    with BuildSketch(Plane(origin=(-7.85, 0, 0), x_dir=(0, 0, -1), z_dir=(1, 0, 0))):
        with Locations((-8, 11.5)):
            Rectangle(SKETCH_55_W, SKETCH_55_H)
    extrude(amount=EXTRUDE_20_DEPTH)

    # Sketch 56 → Extrude 21 (add)
    with BuildSketch(Plane.XY.offset(7)):
        with Locations((-5.35, -11.5)):
            Rectangle(SKETCH_56_W, SKETCH_56_H)
    extrude(amount=EXTRUDE_21_DEPTH)

    # Sketch 57 → Extrude 22 (add)
    with BuildSketch(Plane(origin=(-4.35, 0, 0), x_dir=(0, 0, -1), z_dir=(1, 0, 0))):
        with Locations((-8, -11.5)):
            Rectangle(SKETCH_57_W, SKETCH_57_H)
    extrude(amount=EXTRUDE_22_DEPTH)

    # Sketch 58 → Extrude 24 (add)
    with BuildSketch(Plane.XY.offset(1)):
        with Locations((-7.1, 11.05)):
            Rectangle(SKETCH_58_W, SKETCH_58_H)
        with Locations((-3.1, 11.05)):
            Rectangle(SKETCH_58_W, SKETCH_58_H)
        with Locations((-3.6, -11)):
            Rectangle(SKETCH_58_W, SKETCH_58_H_2)
        with Locations((0.4, -11)):
            Rectangle(SKETCH_58_W, SKETCH_58_H_2)
    extrude(amount=EXTRUDE_24_DEPTH)

    # Sketch 59 → Extrude 25 (add)
    with BuildSketch(Plane(origin=(0, 0, 7), x_dir=(-1, 0, 0), z_dir=(0, 0, -1))):
        with Locations((-2.65, 11.5)):
            Rectangle(SKETCH_59_W, SKETCH_59_H)
    extrude(amount=EXTRUDE_25_DEPTH)

    # Sketch 61 → Cut-Extrude 22 (cut)
    with BuildSketch(Plane(origin=(0, 12, 0), x_dir=(1, 0, 0), z_dir=(0, 1, 0))):
        with BuildLine():
            Line((-9.6, -6.159611152), (-9.6, -4.5))
            ThreePointArc((-9.6, -4.5), (-9.85, -4.25), (-10.1, -4.5))
            Line((-10.1, -4.5), (-10.1, -6.159611152))
            ThreePointArc((-10.1, -6.159611152), (-9.85, -6.409611152), (-9.6, -6.159611152))
        make_face()
        with BuildLine():
            ThreePointArc((-9.101668523, -5.8), (-9.85, -3), (-10.598331477, -5.8))
            ThreePointArc((-10.598331477, -5.8), (-10.274165739, -5.624165739), (-10.45, -5.3))
            ThreePointArc((-10.45, -5.3), (-9.85, -3.5), (-9.25, -5.3))
            ThreePointArc((-9.25, -5.3), (-9.425834261, -5.624165739), (-9.101668523, -5.8))
        make_face()
    extrude(amount=-CUT_EXTRUDE_22_DEPTH, mode=Mode.SUBTRACT)

    # Sketch 60 → Cut-Extrude 23 (cut)
    with BuildSketch(Plane(origin=(0, 12, 0), x_dir=(1, 0, 0), z_dir=(0, 1, 0))):
        Polygon((4.45, -8.8), (4.45, -7.2), (5.049338639, -7.8), (5.403086939, -7.446641626), (4.200665644, -6.242893478), (2.995979535, -7.4462517), (3.349337909, -7.8), (3.95, -7.2), (3.95, -8.8), align=None)
        Polygon((1.35, -6.242893478), (0.85, -6.242893478), (0.85, -7.842893478), (0.250661361, -7.242893478), (-0.103086939, -7.596251853), (1.099334356, -8.8), (2.304020465, -7.596641778), (1.950662091, -7.242893478), (1.35, -7.842893478), align=None)
    extrude(amount=-CUT_EXTRUDE_23_DEPTH, mode=Mode.SUBTRACT)


solid = part.part
